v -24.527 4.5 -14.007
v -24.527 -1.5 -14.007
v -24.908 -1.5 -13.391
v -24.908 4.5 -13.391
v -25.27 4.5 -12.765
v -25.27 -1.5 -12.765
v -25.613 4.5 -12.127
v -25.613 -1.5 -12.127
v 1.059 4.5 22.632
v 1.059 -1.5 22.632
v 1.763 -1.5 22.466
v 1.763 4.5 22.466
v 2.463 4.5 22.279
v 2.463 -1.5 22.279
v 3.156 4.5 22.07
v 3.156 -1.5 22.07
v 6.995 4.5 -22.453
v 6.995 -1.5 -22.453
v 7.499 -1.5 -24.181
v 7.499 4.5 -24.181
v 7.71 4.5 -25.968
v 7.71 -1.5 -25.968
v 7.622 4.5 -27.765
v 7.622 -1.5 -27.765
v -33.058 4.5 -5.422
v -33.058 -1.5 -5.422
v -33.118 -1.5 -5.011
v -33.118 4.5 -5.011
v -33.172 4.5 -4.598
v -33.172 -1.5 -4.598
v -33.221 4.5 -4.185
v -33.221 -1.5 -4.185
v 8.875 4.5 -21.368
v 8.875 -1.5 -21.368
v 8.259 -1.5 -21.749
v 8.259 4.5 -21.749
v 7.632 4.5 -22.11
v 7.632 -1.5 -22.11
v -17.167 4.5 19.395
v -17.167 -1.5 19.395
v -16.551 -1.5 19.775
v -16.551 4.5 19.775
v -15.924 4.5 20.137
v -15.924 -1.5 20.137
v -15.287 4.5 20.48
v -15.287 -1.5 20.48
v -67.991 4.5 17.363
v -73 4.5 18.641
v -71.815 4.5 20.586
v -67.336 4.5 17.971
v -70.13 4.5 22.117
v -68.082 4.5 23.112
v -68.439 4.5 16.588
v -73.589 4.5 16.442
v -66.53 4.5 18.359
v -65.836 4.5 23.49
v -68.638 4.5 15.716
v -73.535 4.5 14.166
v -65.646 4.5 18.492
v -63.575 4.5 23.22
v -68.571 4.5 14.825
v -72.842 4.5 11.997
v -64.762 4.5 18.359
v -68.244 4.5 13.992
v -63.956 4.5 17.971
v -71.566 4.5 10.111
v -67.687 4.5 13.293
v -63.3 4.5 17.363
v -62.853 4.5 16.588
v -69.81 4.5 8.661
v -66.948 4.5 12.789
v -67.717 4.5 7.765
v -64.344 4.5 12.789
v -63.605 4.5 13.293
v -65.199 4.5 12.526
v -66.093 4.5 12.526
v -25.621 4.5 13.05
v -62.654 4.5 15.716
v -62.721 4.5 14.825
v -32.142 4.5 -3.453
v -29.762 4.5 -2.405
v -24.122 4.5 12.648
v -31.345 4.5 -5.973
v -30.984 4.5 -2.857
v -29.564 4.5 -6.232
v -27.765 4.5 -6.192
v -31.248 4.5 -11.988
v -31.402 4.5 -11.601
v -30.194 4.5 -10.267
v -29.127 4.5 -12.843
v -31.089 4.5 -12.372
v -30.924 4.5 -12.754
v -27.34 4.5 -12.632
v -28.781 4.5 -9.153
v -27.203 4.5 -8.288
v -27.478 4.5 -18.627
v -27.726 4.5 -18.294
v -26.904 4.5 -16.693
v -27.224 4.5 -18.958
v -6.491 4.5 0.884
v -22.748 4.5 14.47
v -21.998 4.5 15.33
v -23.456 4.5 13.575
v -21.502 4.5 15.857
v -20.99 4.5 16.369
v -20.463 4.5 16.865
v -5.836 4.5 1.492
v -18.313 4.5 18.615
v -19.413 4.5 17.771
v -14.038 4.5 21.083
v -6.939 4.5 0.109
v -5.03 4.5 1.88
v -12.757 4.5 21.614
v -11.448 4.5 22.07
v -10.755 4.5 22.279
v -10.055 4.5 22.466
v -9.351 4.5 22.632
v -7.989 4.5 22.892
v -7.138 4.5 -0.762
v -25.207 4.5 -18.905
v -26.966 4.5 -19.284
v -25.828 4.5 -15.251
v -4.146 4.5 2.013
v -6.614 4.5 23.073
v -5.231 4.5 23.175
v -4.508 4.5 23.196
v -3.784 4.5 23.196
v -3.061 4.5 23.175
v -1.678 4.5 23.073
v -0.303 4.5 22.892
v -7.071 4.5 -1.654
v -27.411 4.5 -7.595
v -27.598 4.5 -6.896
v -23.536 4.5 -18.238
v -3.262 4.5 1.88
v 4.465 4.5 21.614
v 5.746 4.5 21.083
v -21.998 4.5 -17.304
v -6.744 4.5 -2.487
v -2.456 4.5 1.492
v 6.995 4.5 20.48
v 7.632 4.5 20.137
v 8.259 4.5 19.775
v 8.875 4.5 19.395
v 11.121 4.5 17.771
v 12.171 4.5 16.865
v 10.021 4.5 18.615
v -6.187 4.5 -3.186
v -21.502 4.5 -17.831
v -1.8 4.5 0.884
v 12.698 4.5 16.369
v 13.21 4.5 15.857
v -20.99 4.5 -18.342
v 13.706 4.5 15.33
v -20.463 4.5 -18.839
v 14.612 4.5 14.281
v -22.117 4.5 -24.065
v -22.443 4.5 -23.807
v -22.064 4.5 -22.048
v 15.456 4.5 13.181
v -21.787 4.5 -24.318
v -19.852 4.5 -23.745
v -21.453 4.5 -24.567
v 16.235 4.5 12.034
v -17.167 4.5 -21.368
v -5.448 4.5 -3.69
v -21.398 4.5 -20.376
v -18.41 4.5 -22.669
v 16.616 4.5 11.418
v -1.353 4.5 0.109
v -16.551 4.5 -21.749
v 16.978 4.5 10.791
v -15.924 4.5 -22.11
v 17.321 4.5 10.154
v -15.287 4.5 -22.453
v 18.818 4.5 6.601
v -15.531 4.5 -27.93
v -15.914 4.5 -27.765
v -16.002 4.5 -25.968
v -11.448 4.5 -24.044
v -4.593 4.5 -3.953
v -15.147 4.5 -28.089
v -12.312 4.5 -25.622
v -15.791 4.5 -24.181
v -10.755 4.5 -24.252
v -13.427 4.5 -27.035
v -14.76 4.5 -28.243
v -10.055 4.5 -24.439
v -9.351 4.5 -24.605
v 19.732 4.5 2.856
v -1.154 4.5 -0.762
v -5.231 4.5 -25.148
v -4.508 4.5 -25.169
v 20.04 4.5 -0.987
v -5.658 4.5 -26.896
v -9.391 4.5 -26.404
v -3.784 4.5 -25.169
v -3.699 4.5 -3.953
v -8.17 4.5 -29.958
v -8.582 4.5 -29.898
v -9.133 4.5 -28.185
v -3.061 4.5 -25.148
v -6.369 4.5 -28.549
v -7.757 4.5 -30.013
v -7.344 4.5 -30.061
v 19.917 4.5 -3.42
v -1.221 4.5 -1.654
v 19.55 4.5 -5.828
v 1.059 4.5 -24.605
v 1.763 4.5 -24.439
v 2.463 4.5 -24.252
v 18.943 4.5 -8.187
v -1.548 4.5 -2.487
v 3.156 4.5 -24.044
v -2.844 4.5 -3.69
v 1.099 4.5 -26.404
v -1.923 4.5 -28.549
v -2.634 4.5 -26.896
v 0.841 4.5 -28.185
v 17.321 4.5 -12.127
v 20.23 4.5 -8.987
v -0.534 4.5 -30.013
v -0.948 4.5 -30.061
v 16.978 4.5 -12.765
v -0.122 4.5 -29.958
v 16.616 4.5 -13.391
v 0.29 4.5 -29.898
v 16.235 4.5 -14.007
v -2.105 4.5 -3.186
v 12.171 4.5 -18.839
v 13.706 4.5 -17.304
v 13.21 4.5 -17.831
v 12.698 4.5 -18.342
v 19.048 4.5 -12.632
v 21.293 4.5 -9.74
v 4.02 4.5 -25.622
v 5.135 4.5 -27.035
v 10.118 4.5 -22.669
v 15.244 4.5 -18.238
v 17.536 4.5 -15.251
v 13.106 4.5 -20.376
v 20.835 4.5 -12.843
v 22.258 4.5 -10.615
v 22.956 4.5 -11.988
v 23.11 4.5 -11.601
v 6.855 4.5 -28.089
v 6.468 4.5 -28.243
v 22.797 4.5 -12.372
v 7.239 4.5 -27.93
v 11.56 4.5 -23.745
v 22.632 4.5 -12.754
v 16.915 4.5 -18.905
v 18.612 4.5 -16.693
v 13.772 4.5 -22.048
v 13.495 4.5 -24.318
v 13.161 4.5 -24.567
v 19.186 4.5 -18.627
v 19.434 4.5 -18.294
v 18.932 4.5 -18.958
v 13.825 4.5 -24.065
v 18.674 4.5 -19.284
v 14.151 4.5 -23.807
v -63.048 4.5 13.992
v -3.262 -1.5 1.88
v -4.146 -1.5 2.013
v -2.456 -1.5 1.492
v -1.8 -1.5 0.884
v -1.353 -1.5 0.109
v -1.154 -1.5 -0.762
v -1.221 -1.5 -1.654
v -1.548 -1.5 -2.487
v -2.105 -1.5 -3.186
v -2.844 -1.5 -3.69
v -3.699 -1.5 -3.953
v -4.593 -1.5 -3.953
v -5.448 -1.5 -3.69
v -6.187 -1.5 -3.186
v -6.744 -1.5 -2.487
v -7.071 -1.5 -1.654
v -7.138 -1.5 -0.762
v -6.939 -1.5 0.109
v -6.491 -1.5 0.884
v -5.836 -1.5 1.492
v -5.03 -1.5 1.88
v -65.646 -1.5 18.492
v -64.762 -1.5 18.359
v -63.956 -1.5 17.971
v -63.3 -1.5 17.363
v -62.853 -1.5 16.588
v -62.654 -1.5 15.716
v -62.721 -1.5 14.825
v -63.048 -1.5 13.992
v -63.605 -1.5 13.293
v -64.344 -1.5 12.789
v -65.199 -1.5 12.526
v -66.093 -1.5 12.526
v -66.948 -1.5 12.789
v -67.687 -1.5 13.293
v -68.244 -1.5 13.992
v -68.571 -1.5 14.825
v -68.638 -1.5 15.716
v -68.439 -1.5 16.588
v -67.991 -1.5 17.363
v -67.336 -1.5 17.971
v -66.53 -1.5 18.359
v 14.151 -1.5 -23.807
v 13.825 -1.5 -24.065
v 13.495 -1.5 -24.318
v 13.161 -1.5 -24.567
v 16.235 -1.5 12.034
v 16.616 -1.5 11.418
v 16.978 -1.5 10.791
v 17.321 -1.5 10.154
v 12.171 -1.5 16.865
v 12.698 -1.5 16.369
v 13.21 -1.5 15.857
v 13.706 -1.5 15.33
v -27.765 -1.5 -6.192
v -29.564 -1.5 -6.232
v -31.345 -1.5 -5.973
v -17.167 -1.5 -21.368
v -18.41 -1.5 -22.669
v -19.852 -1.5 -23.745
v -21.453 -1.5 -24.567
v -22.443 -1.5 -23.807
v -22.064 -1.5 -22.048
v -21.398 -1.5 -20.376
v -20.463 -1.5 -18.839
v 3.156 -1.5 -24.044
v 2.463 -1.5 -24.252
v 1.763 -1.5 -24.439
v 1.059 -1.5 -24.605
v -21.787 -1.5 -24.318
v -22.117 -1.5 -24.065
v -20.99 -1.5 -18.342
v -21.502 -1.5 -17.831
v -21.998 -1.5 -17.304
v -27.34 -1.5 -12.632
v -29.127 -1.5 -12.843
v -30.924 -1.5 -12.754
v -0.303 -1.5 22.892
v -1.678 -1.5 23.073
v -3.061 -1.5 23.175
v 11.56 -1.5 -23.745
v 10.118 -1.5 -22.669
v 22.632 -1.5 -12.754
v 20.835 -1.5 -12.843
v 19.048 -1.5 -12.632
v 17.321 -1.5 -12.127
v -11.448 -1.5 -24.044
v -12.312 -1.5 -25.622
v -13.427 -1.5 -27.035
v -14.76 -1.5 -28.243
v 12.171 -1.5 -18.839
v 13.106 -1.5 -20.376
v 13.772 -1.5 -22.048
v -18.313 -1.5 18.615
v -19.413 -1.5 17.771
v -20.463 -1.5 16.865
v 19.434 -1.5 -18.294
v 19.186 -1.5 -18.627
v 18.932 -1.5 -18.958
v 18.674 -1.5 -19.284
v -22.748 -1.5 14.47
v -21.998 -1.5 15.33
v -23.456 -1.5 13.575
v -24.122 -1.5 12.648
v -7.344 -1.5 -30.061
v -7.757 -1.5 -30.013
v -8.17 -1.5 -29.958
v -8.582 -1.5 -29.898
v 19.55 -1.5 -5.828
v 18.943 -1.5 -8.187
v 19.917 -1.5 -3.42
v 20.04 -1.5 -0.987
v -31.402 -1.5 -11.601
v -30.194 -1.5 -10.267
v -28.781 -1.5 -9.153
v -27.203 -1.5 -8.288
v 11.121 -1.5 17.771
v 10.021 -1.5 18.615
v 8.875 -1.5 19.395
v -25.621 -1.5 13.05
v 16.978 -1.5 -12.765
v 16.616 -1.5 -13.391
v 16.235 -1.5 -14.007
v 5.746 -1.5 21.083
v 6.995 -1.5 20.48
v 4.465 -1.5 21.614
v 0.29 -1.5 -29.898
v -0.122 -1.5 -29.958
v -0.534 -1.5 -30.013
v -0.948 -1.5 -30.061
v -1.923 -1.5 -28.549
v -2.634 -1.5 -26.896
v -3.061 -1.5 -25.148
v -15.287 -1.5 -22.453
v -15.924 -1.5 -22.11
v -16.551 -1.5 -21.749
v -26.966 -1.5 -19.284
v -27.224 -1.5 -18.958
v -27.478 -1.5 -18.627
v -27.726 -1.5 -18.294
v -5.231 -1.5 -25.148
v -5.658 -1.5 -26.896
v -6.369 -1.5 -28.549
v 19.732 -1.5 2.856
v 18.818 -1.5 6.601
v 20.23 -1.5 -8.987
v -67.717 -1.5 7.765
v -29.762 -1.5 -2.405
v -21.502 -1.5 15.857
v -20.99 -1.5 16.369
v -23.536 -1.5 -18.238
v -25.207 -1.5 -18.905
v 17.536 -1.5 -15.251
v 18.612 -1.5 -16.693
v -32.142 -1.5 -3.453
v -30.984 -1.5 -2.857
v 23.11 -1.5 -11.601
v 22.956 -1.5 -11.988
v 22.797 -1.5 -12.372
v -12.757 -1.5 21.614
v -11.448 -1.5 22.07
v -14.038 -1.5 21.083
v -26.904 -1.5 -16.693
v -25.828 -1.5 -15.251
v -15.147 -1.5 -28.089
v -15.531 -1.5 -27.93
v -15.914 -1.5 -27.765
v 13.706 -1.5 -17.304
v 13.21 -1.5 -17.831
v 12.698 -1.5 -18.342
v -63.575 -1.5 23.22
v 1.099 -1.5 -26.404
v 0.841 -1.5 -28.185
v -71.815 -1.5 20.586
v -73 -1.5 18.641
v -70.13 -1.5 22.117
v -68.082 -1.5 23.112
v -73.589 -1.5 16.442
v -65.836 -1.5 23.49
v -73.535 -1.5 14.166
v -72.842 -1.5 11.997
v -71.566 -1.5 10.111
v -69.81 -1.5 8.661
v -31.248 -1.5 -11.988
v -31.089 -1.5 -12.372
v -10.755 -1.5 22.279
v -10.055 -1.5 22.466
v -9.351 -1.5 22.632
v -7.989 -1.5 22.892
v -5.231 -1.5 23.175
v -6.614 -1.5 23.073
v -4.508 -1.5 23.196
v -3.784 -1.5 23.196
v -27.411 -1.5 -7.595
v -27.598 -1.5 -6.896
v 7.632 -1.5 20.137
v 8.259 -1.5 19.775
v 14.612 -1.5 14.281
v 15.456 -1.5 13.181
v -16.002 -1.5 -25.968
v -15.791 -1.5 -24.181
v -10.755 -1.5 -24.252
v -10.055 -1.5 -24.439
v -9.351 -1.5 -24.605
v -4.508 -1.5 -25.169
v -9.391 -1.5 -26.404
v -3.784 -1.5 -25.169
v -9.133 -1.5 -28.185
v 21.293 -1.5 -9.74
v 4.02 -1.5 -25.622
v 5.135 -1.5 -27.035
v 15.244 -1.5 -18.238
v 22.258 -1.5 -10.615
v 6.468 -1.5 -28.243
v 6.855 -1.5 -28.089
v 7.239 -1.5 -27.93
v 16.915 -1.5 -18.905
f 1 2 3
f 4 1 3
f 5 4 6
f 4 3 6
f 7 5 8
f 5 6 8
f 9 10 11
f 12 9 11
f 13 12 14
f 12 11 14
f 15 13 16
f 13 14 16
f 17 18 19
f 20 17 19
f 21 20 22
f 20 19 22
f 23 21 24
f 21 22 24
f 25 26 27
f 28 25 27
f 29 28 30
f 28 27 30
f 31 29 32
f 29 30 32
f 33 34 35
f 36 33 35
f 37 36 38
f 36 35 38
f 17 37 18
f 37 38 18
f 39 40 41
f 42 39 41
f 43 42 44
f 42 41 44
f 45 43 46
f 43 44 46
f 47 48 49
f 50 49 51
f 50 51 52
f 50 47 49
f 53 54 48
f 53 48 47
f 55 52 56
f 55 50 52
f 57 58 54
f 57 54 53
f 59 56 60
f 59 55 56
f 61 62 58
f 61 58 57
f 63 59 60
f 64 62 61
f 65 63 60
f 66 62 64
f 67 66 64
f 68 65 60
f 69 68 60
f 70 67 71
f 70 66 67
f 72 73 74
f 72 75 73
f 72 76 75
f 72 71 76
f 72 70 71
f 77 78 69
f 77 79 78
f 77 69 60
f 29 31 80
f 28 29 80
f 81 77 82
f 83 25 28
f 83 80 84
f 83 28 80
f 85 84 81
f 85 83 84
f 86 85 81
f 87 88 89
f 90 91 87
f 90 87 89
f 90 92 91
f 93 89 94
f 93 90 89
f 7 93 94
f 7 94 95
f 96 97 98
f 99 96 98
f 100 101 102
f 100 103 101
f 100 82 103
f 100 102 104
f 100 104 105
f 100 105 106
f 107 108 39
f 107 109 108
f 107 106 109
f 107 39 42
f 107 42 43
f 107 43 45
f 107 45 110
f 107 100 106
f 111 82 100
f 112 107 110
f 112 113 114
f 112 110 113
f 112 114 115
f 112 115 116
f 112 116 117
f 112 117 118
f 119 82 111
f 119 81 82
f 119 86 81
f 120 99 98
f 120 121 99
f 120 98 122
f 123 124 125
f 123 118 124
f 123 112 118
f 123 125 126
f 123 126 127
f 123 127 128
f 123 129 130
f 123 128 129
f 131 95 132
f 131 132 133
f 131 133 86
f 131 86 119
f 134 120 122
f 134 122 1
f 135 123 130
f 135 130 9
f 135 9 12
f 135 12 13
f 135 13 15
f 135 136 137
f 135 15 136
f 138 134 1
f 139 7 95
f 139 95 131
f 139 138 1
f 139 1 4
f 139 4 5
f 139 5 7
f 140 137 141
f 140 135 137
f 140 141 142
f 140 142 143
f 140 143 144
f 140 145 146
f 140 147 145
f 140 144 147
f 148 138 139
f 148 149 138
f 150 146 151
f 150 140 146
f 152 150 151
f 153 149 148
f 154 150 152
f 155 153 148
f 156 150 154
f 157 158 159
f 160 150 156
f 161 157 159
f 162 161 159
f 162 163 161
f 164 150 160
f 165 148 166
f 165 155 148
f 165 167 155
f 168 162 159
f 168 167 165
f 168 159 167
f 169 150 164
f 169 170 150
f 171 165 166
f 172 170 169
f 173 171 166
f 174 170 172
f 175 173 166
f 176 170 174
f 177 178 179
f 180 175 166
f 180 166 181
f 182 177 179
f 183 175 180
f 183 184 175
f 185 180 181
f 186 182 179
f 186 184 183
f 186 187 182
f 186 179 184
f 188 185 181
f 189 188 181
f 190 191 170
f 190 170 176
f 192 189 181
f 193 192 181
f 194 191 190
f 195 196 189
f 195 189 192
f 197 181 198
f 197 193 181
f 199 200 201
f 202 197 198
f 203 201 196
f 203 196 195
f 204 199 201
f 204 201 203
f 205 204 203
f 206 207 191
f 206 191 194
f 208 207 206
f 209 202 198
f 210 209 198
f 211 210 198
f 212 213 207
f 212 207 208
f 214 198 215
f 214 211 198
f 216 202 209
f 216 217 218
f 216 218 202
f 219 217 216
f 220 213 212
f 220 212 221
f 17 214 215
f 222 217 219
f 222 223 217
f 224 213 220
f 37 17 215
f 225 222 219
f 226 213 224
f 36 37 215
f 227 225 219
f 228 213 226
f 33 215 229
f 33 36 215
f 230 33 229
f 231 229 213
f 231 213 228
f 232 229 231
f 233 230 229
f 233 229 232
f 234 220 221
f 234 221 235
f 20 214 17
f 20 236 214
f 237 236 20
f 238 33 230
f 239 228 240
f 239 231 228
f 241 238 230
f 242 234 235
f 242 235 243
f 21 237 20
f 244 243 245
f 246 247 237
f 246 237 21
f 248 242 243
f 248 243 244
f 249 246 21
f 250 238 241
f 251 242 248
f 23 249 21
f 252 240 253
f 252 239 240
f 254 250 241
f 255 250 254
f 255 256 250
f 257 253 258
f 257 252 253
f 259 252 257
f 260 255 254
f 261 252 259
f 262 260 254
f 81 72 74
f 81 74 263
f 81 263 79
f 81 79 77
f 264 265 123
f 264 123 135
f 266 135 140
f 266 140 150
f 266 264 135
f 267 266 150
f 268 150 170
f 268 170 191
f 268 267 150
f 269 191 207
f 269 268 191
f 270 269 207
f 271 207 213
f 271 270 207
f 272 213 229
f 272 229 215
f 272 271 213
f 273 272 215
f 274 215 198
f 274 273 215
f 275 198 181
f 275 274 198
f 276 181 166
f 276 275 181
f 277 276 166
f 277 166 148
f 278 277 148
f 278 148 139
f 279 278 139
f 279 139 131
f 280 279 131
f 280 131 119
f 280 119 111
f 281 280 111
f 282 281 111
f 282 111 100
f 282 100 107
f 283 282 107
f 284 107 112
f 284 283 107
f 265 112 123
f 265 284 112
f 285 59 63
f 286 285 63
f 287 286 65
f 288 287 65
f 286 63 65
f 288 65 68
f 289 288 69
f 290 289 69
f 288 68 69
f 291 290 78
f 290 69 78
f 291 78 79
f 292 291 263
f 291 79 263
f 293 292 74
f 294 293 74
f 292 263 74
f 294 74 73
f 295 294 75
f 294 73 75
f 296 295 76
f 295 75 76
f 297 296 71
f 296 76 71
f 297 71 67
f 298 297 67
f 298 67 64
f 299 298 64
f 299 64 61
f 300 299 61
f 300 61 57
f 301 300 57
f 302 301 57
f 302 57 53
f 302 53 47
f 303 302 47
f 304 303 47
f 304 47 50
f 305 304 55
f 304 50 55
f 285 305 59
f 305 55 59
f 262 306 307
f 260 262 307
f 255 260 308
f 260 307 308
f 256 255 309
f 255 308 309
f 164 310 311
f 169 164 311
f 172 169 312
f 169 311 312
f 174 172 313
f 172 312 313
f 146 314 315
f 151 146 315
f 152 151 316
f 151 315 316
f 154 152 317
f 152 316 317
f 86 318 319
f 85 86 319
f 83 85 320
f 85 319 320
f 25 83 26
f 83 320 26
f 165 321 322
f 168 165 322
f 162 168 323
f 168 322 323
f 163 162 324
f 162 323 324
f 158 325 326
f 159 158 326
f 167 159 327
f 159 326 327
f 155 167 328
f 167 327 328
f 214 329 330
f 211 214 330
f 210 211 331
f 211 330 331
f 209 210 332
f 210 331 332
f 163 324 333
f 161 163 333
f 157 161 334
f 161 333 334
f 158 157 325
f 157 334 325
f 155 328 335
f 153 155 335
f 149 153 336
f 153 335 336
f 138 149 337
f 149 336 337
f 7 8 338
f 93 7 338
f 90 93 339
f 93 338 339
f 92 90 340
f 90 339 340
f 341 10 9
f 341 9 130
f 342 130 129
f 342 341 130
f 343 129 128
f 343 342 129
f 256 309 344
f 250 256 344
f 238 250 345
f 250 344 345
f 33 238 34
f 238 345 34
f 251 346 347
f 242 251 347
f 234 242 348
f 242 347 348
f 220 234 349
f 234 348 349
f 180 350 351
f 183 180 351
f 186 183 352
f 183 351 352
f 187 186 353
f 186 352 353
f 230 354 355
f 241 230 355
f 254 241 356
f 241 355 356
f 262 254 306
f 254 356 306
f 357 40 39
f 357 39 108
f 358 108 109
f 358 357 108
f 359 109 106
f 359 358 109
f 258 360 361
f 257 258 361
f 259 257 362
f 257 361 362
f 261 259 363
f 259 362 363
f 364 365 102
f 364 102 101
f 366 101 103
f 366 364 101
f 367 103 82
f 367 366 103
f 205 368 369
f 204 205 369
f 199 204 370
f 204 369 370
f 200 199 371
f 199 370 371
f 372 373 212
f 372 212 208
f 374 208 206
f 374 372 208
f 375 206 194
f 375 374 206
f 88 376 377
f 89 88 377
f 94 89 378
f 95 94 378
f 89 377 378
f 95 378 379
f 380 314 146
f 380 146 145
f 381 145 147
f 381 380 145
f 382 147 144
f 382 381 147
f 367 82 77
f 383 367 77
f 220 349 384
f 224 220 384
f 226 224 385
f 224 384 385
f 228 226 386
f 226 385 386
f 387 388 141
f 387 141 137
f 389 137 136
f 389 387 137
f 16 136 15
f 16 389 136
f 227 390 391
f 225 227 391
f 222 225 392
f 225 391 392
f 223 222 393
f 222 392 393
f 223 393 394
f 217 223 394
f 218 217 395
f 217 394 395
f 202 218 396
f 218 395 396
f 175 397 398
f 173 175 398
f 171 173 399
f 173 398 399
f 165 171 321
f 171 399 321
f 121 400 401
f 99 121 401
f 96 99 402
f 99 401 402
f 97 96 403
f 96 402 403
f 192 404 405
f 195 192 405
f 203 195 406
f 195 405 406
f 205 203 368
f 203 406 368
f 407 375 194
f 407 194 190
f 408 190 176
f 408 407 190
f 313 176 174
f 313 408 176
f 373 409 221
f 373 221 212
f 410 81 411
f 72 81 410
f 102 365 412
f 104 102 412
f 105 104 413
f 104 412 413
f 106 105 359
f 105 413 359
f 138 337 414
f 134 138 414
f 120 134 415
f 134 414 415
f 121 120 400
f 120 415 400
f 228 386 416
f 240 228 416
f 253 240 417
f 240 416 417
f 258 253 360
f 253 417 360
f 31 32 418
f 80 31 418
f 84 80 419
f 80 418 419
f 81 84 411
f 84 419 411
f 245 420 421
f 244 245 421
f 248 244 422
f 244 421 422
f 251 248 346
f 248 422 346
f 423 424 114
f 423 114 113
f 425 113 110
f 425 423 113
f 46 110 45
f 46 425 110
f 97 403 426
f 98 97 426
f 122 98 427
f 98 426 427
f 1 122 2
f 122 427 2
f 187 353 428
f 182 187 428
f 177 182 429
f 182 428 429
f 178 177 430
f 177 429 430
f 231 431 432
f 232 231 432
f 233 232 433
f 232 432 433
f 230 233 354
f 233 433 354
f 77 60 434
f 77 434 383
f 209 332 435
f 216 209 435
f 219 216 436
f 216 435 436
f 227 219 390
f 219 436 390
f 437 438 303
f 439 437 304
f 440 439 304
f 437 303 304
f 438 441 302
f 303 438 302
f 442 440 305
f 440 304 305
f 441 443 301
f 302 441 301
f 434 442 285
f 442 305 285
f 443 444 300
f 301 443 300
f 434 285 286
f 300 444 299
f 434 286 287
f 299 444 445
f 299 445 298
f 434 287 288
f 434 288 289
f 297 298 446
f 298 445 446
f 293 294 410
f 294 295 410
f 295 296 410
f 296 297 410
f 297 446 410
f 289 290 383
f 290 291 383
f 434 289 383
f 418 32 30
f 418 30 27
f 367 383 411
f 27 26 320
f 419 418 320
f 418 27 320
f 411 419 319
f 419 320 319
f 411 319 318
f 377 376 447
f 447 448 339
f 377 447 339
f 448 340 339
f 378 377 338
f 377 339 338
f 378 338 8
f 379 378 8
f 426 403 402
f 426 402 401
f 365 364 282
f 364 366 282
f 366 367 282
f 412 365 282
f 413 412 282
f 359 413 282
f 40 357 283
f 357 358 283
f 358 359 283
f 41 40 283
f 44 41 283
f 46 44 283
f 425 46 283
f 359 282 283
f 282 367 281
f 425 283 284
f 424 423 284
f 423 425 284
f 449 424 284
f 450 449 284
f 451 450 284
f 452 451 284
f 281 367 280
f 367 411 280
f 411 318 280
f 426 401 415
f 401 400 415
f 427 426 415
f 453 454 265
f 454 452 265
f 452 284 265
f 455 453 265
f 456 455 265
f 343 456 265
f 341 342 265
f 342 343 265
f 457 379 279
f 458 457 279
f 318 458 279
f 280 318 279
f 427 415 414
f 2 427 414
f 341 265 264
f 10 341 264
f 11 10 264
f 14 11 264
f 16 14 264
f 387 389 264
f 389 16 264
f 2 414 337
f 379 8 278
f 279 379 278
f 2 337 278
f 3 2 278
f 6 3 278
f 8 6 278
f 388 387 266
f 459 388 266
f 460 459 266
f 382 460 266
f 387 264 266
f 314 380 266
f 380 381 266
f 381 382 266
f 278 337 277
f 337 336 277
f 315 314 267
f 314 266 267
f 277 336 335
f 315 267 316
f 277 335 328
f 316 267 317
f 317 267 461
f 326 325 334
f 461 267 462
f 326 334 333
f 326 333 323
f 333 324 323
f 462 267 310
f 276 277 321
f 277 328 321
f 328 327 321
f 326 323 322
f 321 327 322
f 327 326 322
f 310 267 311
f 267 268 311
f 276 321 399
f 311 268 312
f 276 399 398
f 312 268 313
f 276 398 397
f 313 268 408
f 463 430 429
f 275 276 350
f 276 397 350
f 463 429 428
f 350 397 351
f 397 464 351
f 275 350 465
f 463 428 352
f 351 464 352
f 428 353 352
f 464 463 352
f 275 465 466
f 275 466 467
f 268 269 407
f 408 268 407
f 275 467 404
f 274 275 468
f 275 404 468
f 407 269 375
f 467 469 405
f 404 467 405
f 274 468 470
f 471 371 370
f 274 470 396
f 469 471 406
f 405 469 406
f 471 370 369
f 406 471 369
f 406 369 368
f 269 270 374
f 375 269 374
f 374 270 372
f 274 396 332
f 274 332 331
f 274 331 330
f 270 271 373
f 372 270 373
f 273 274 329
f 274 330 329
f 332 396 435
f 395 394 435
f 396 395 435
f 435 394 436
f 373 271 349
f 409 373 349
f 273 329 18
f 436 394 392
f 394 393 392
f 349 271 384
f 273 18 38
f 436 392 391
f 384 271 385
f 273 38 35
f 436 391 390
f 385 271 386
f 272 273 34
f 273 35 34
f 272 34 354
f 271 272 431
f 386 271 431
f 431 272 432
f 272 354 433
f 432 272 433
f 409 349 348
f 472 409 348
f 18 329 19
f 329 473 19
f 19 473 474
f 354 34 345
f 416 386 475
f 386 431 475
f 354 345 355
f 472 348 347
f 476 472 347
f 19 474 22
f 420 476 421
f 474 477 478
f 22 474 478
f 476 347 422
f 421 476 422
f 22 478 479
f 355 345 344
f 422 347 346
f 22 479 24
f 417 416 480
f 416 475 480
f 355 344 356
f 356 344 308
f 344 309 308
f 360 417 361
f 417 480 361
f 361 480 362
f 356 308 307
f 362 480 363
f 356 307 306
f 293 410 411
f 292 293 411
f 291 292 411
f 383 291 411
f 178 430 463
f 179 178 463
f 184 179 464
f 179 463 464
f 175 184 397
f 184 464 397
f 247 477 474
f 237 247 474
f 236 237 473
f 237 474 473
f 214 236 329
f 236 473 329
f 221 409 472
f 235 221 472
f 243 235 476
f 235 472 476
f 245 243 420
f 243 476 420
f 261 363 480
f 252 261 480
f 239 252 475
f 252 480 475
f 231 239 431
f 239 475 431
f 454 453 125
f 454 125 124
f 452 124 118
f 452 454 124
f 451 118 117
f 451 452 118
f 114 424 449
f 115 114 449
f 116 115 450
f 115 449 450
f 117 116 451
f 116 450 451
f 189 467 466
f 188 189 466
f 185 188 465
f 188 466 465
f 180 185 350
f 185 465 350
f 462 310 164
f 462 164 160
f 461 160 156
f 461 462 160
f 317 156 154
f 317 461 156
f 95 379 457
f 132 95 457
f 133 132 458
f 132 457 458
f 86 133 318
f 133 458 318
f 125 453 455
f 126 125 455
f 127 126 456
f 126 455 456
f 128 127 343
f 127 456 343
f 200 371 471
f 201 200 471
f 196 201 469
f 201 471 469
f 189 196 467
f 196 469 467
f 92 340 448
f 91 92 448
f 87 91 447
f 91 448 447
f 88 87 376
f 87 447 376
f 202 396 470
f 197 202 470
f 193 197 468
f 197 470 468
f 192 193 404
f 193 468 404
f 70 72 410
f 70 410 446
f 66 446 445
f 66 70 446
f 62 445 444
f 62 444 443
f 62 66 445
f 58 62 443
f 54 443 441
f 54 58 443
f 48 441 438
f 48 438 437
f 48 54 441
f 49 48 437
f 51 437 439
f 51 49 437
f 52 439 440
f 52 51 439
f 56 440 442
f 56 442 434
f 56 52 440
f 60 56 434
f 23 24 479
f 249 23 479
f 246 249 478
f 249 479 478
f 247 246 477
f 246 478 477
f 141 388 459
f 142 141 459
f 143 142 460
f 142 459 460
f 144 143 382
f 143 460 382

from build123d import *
from build123d.topology import SkipClean

# Parameters (mm, degrees)
SKETCH1_R           = 1.5
BOSS_EXTRUDE1_DEPTH = 3
SKETCH3_R           = 1.5
BOSS_EXTRUDE2_DEPTH = 3
CUT_EXTRUDE1_START  = -3
CUT_EXTRUDE1_DEPTH  = 3
SCALE1_SCALE        = 2


with BuildPart() as part:
    # Sketch1 → Boss-Extrude1 (new body)
    with BuildSketch(Plane(origin=(0, 0, 0), x_dir=(1, 0, 0), z_dir=(0, 1, 0))):
        with BuildLine():
            Line((20.643657446, 4), (2.081641936, 4))
            ThreePointArc((2.081641936, 4), (2.861028333, 4.588201733), (3.521749436, 5.30713988))
            ThreePointArc((3.521749436, 5.30713988), (3.405395609, 5.596745198), (3.282888305, 5.883801663))
            ThreePointArc((3.282888305, 5.883801663), (1.93527598, 5.894040025), (0.627094961, 5.57027124))
            ThreePointArc((0.627094961, 5.57027124), (0.366286148, 6.046375), (0.084372603, 6.510293938))
            ThreePointArc((0.084372603, 6.510293938), (1.018855105, 7.48132754), (1.683794586, 8.65351323))
            ThreePointArc((1.683794586, 8.65351323), (1.496450048, 8.903135899), (1.303821399, 9.148703928))
            ThreePointArc((1.303821399, 9.148703928), (-0.000522033, 8.809805691), (-1.180330337, 8.158486898))
            ThreePointArc((-1.180330337, 8.158486898), (-1.555477026, 8.550865528), (-1.947855656, 8.926012217))
            ThreePointArc((-1.947855656, 8.926012217), (-1.296536862, 10.105820521), (-0.957638625, 11.410163953))
            ThreePointArc((-0.957638625, 11.410163953), (-1.203206655, 11.602792602), (-1.452829324, 11.79013714))
            ThreePointArc((-1.452829324, 11.79013714), (-2.625015014, 11.125197659), (-3.596048616, 10.190715157))
            ThreePointArc((-3.596048616, 10.190715157), (-4.059967554, 10.472628702), (-4.536071314, 10.733437515))
            ThreePointArc((-4.536071314, 10.733437515), (-4.212302529, 12.041618533), (-4.222540891, 13.389230859))
            ThreePointArc((-4.222540891, 13.389230859), (-4.509597355, 13.511738163), (-4.799202674, 13.62809199))
            ThreePointArc((-4.799202674, 13.62809199), (-5.759348103, 12.682425791), (-6.455432668, 11.528463019))
            ThreePointArc((-6.455432668, 11.528463019), (-6.976508546, 11.680699536), (-7.503891752, 11.809396783))
            ThreePointArc((-7.503891752, 11.809396783), (-7.529737283, 13.156800143), (-7.888414517, 14.455843809))
            ThreePointArc((-7.888414517, 14.455843809), (-8.197396993, 14.499881098), (-8.507248835, 14.537314892))
            ThreePointArc((-8.507248835, 14.537314892), (-9.18992168, 13.375367565), (-9.563620196, 12.080565177))
            ThreePointArc((-9.563620196, 12.080565177), (-10.106342554, 12.09275), (-10.649064912, 12.080565177))
            ThreePointArc((-10.649064912, 12.080565177), (-11.022763428, 13.375367565), (-11.705436272, 14.537314892))
            ThreePointArc((-11.705436272, 14.537314892), (-12.015288115, 14.499881098), (-12.324270591, 14.455843809))
            ThreePointArc((-12.324270591, 14.455843809), (-12.682947825, 13.156800143), (-12.708793355, 11.809396783))
            ThreePointArc((-12.708793355, 11.809396783), (-13.236176561, 11.680699536), (-13.757252439, 11.528463019))
            ThreePointArc((-13.757252439, 11.528463019), (-14.453337005, 12.682425791), (-15.413482434, 13.62809199))
            ThreePointArc((-15.413482434, 13.62809199), (-15.703087752, 13.511738163), (-15.990144217, 13.389230859))
            ThreePointArc((-15.990144217, 13.389230859), (-16.000382579, 12.041618533), (-15.676613793, 10.733437515))
            ThreePointArc((-15.676613793, 10.733437515), (-16.152717554, 10.472628702), (-16.616636492, 10.190715157))
            ThreePointArc((-16.616636492, 10.190715157), (-17.587670094, 11.125197659), (-18.759855783, 11.79013714))
            ThreePointArc((-18.759855783, 11.79013714), (-19.009478453, 11.602792602), (-19.255046482, 11.410163953))
            ThreePointArc((-19.255046482, 11.410163953), (-18.916148245, 10.105820521), (-18.264829452, 8.926012217))
            ThreePointArc((-18.264829452, 8.926012217), (-18.657208082, 8.550865528), (-19.032354771, 8.158486898))
            ThreePointArc((-19.032354771, 8.158486898), (-20.212163074, 8.809805691), (-21.516506507, 9.148703928))
            ThreePointArc((-21.516506507, 9.148703928), (-21.709135156, 8.903135899), (-21.896479694, 8.65351323))
            ThreePointArc((-21.896479694, 8.65351323), (-21.231540213, 7.48132754), (-20.297057711, 6.510293938))
            ThreePointArc((-20.297057711, 6.510293938), (-20.578971255, 6.046375), (-20.839780068, 5.57027124))
            ThreePointArc((-20.839780068, 5.57027124), (-22.147961087, 5.894040025), (-23.495573413, 5.883801663))
            ThreePointArc((-23.495573413, 5.883801663), (-23.618080717, 5.596745198), (-23.734434544, 5.30713988))
            ThreePointArc((-23.734434544, 5.30713988), (-22.788768345, 4.346994451), (-21.634805572, 3.650909885))
            ThreePointArc((-21.634805572, 3.650909885), (-21.78704209, 3.129834008), (-21.915739337, 2.602450802))
            ThreePointArc((-21.915739337, 2.602450802), (-23.263142697, 2.576605271), (-24.562186363, 2.217928037))
            ThreePointArc((-24.562186363, 2.217928037), (-24.606223651, 1.908945561), (-24.643657446, 1.599093719))
            ThreePointArc((-24.643657446, 1.599093719), (-23.481710119, 0.916420874), (-22.186907731, 0.542722358))
            ThreePointArc((-22.186907731, 0.542722358), (-22.199092554, 0), (-22.186907731, -0.542722358))
            ThreePointArc((-22.186907731, -0.542722358), (-23.481710119, -0.916420874), (-24.643657446, -1.599093719))
            ThreePointArc((-24.643657446, -1.599093719), (-24.606223651, -1.908945561), (-24.562186363, -2.217928037))
            ThreePointArc((-24.562186363, -2.217928037), (-23.263142697, -2.576605271), (-21.915739337, -2.602450802))
            ThreePointArc((-21.915739337, -2.602450802), (-21.78704209, -3.129834008), (-21.634805572, -3.650909885))
            ThreePointArc((-21.634805572, -3.650909885), (-22.788768345, -4.346994451), (-23.734434544, -5.30713988))
            ThreePointArc((-23.734434544, -5.30713988), (-23.618080717, -5.596745198), (-23.495573413, -5.883801663))
            ThreePointArc((-23.495573413, -5.883801663), (-22.147961087, -5.894040025), (-20.839780068, -5.57027124))
            ThreePointArc((-20.839780068, -5.57027124), (-20.578971255, -6.046375), (-20.297057711, -6.510293938))
            ThreePointArc((-20.297057711, -6.510293938), (-21.231540213, -7.48132754), (-21.896479694, -8.65351323))
            ThreePointArc((-21.896479694, -8.65351323), (-21.709135156, -8.903135899), (-21.516506507, -9.148703928))
            ThreePointArc((-21.516506507, -9.148703928), (-20.212163074, -8.809805691), (-19.032354771, -8.158486898))
            ThreePointArc((-19.032354771, -8.158486898), (-18.657208082, -8.550865528), (-18.264829452, -8.926012217))
            ThreePointArc((-18.264829452, -8.926012217), (-18.916148245, -10.105820521), (-19.255046482, -11.410163953))
            ThreePointArc((-19.255046482, -11.410163953), (-19.009478453, -11.602792602), (-18.759855783, -11.79013714))
            ThreePointArc((-18.759855783, -11.79013714), (-17.587670094, -11.125197659), (-16.616636492, -10.190715157))
            ThreePointArc((-16.616636492, -10.190715157), (-16.152717554, -10.472628702), (-15.676613793, -10.733437515))
            ThreePointArc((-15.676613793, -10.733437515), (-16.000382579, -12.041618533), (-15.990144217, -13.389230859))
            ThreePointArc((-15.990144217, -13.389230859), (-15.703087752, -13.511738163), (-15.413482434, -13.62809199))
            ThreePointArc((-15.413482434, -13.62809199), (-14.453337005, -12.682425791), (-13.757252439, -11.528463019))
            ThreePointArc((-13.757252439, -11.528463019), (-13.236176561, -11.680699536), (-12.708793355, -11.809396783))
            ThreePointArc((-12.708793355, -11.809396783), (-12.682947825, -13.156800143), (-12.324270591, -14.455843809))
            ThreePointArc((-12.324270591, -14.455843809), (-12.015288115, -14.499881098), (-11.705436272, -14.537314892))
            ThreePointArc((-11.705436272, -14.537314892), (-11.022763428, -13.375367565), (-10.649064912, -12.080565177))
            ThreePointArc((-10.649064912, -12.080565177), (-10.106342554, -12.09275), (-9.563620196, -12.080565177))
            ThreePointArc((-9.563620196, -12.080565177), (-9.18992168, -13.375367565), (-8.507248835, -14.537314892))
            ThreePointArc((-8.507248835, -14.537314892), (-8.197396993, -14.499881098), (-7.888414517, -14.455843809))
            ThreePointArc((-7.888414517, -14.455843809), (-7.529737283, -13.156800143), (-7.503891752, -11.809396783))
            ThreePointArc((-7.503891752, -11.809396783), (-6.976508546, -11.680699536), (-6.455432668, -11.528463019))
            ThreePointArc((-6.455432668, -11.528463019), (-5.759348103, -12.682425791), (-4.799202674, -13.62809199))
            ThreePointArc((-4.799202674, -13.62809199), (-4.509597355, -13.511738163), (-4.222540891, -13.389230859))
            ThreePointArc((-4.222540891, -13.389230859), (-4.212302529, -12.041618533), (-4.536071314, -10.733437515))
            ThreePointArc((-4.536071314, -10.733437515), (-4.059967554, -10.472628702), (-3.596048616, -10.190715157))
            ThreePointArc((-3.596048616, -10.190715157), (-2.625015014, -11.125197659), (-1.452829324, -11.79013714))
            ThreePointArc((-1.452829324, -11.79013714), (-1.203206655, -11.602792602), (-0.957638625, -11.410163953))
            ThreePointArc((-0.957638625, -11.410163953), (-1.296536862, -10.105820521), (-1.947855656, -8.926012217))
            ThreePointArc((-1.947855656, -8.926012217), (-1.555477026, -8.550865528), (-1.180330337, -8.158486898))
            ThreePointArc((-1.180330337, -8.158486898), (-0.000522033, -8.809805691), (1.303821399, -9.148703928))
            ThreePointArc((1.303821399, -9.148703928), (1.496450048, -8.903135899), (1.683794586, -8.65351323))
            ThreePointArc((1.683794586, -8.65351323), (1.018855105, -7.48132754), (0.084372603, -6.510293938))
            ThreePointArc((0.084372603, -6.510293938), (0.366286148, -6.046375), (0.627094961, -5.57027124))
            ThreePointArc((0.627094961, -5.57027124), (1.93527598, -5.894040025), (3.282888305, -5.883801663))
            ThreePointArc((3.282888305, -5.883801663), (3.405395609, -5.596745198), (3.521749436, -5.30713988))
            ThreePointArc((3.521749436, -5.30713988), (2.861028333, -4.588201733), (2.081641936, -4))
            Line((2.081641936, -4), (20.643657446, -4))
            ThreePointArc((20.643657446, -4), (24.643657446, 0), (20.643657446, 4))
        make_face()
        with Locations(Location((-10.106342554, 0, 0), (0, 0, 270))):
            Circle(SKETCH1_R, mode=Mode.SUBTRACT)
        with Locations(Location((20.643657446, 0, 0), (0, 0, 270))):
            Circle(SKETCH1_R, mode=Mode.SUBTRACT)
    extrude(amount=BOSS_EXTRUDE1_DEPTH)

    # Sketch3 → Boss-Extrude2 (add)
    with BuildSketch(Plane(origin=(0, 3, 0), x_dir=(1, 0, 0), z_dir=(0, 1, 0))):
        with BuildLine():
            ThreePointArc((-9.071066373, -3.863703305), (-13.970045859, -1.03527618), (-11.141618734, 3.863703305))
            Line((-11.141618734, 3.863703305), (-41.891618734, -4.375734362))
            ThreePointArc((-41.891618734, -4.375734362), (-44.720045859, -9.274713848), (-39.821066373, -12.103140972))
            Line((-39.821066373, -12.103140972), (-9.071066373, -3.863703305))
        make_face()
        with Locations(Location((-40.856342554, -8.239437667, 0), (0, 0, 270))):
            Circle(SKETCH3_R, mode=Mode.SUBTRACT)
    extrude(amount=-BOSS_EXTRUDE2_DEPTH)

    # Sketch4 → Cut-Extrude1 (cut)
    with SkipClean():  # the faces are left unmerged after this step: merging them gives an invalid solid
        with BuildSketch(Plane(origin=(0, 3, 0), x_dir=(1, 0, 0), z_dir=(0, 1, 0)).offset(CUT_EXTRUDE1_START)):
            with BuildLine():
                ThreePointArc((-21.516506507, -9.148703928), (-20.212163074, -8.809805691), (-19.032354771, -8.158486898))
                ThreePointArc((-19.032354771, -8.158486898), (-19.58704562, -7.506721784), (-20.094248238, -6.817355984))
                Line((-20.094248238, -6.817355984), (-20.843755363, -7.018185813))
                ThreePointArc((-20.843755363, -7.018185813), (-21.444347002, -7.788065101), (-21.896479694, -8.65351323))
                ThreePointArc((-21.896479694, -8.65351323), (-21.709135156, -8.903135899), (-21.516506507, -9.148703928))
            make_face()
            with BuildLine():
                ThreePointArc((-18.759855783, -11.79013714), (-17.587670094, -11.125197659), (-16.616636492, -10.190715157))
                ThreePointArc((-16.616636492, -10.190715157), (-17.467942324, -9.593823606), (-18.264829452, -8.926012217))
                ThreePointArc((-18.264829452, -8.926012217), (-18.916148245, -10.105820521), (-19.255046482, -11.410163953))
                ThreePointArc((-19.255046482, -11.410163953), (-19.009478453, -11.602792602), (-18.759855783, -11.79013714))
            make_face()
            with BuildLine():
                ThreePointArc((-15.413482434, -13.62809199), (-14.453337005, -12.682425791), (-13.757252439, -11.528463019))
                ThreePointArc((-13.757252439, -11.528463019), (-14.734037631, -11.172244217), (-15.676613793, -10.733437515))
                ThreePointArc((-15.676613793, -10.733437515), (-16.000382579, -12.041618533), (-15.990144217, -13.389230859))
                ThreePointArc((-15.990144217, -13.389230859), (-15.703087752, -13.511738163), (-15.413482434, -13.62809199))
            make_face()
            with BuildLine():
                ThreePointArc((-11.705436272, -14.537314892), (-11.022763428, -13.375367565), (-10.649064912, -12.080565177))
                ThreePointArc((-10.649064912, -12.080565177), (-11.684763165, -11.989294847), (-12.708793355, -11.809396783))
                ThreePointArc((-12.708793355, -11.809396783), (-12.682947825, -13.156800143), (-12.324270591, -14.455843809))
                ThreePointArc((-12.324270591, -14.455843809), (-12.015288115, -14.499881098), (-11.705436272, -14.537314892))
            make_face()
            with BuildLine():
                ThreePointArc((-7.888414517, -14.455843809), (-7.529737283, -13.156800143), (-7.503891752, -11.809396783))
                ThreePointArc((-7.503891752, -11.809396783), (-8.527921943, -11.989294847), (-9.563620196, -12.080565177))
                ThreePointArc((-9.563620196, -12.080565177), (-9.18992168, -13.375367565), (-8.507248835, -14.537314892))
                ThreePointArc((-8.507248835, -14.537314892), (-8.197396993, -14.499881098), (-7.888414517, -14.455843809))
            make_face()
            with BuildLine():
                ThreePointArc((-4.222540891, -13.389230859), (-4.212302529, -12.041618533), (-4.536071314, -10.733437515))
                ThreePointArc((-4.536071314, -10.733437515), (-5.478647477, -11.172244217), (-6.455432668, -11.528463019))
                ThreePointArc((-6.455432668, -11.528463019), (-5.759348103, -12.682425791), (-4.799202674, -13.62809199))
                ThreePointArc((-4.799202674, -13.62809199), (-4.509597355, -13.511738163), (-4.222540891, -13.389230859))
            make_face()
            with BuildLine():
                ThreePointArc((-0.957638625, -11.410163953), (-1.296536862, -10.105820521), (-1.947855656, -8.926012217))
                ThreePointArc((-1.947855656, -8.926012217), (-2.744742783, -9.593823606), (-3.596048616, -10.190715157))
                ThreePointArc((-3.596048616, -10.190715157), (-2.625015014, -11.125197659), (-1.452829324, -11.79013714))
                ThreePointArc((-1.452829324, -11.79013714), (-1.203206655, -11.602792602), (-0.957638625, -11.410163953))
            make_face()
            with BuildLine():
                ThreePointArc((1.683794586, -8.65351323), (1.018855105, -7.48132754), (0.084372603, -6.510293938))
                ThreePointArc((0.084372603, -6.510293938), (-0.512518948, -7.361599771), (-1.180330337, -8.158486898))
                ThreePointArc((-1.180330337, -8.158486898), (-0.000522033, -8.809805691), (1.303821399, -9.148703928))
                ThreePointArc((1.303821399, -9.148703928), (1.496450048, -8.903135899), (1.683794586, -8.65351323))
            make_face()
            with BuildLine():
                ThreePointArc((20.643657446, -4), (24.643657446, 0), (20.643657446, 4))
                Line((20.643657446, 4), (2.081641936, 4))
                Line((2.081641936, 4), (1.43808022, 3.600125745))
                ThreePointArc((1.43808022, 3.600125745), (1.848539735, 1.820821801), (1.986407446, 0))
                ThreePointArc((1.986407446, 0), (1.641665343, -2.866864669), (0.627094961, -5.57027124))
                ThreePointArc((0.627094961, -5.57027124), (1.93527598, -5.894040025), (3.282888305, -5.883801663))
                ThreePointArc((3.282888305, -5.883801663), (3.405395609, -5.596745198), (3.521749436, -5.30713988))
                ThreePointArc((3.521749436, -5.30713988), (2.861028333, -4.588201733), (2.081641936, -4))
                Line((2.081641936, -4), (20.643657446, -4))
            make_face()
        extrude(amount=CUT_EXTRUDE1_DEPTH, mode=Mode.SUBTRACT)


with BuildPart() as part_1:
    # Scale1: scaled about (-16.0667017, 1.5, 0.986610276)
    add(part.part.scale(SCALE1_SCALE).moved(Location((16.0667017, -1.5, -0.986610276))))


solid = part_1.part
